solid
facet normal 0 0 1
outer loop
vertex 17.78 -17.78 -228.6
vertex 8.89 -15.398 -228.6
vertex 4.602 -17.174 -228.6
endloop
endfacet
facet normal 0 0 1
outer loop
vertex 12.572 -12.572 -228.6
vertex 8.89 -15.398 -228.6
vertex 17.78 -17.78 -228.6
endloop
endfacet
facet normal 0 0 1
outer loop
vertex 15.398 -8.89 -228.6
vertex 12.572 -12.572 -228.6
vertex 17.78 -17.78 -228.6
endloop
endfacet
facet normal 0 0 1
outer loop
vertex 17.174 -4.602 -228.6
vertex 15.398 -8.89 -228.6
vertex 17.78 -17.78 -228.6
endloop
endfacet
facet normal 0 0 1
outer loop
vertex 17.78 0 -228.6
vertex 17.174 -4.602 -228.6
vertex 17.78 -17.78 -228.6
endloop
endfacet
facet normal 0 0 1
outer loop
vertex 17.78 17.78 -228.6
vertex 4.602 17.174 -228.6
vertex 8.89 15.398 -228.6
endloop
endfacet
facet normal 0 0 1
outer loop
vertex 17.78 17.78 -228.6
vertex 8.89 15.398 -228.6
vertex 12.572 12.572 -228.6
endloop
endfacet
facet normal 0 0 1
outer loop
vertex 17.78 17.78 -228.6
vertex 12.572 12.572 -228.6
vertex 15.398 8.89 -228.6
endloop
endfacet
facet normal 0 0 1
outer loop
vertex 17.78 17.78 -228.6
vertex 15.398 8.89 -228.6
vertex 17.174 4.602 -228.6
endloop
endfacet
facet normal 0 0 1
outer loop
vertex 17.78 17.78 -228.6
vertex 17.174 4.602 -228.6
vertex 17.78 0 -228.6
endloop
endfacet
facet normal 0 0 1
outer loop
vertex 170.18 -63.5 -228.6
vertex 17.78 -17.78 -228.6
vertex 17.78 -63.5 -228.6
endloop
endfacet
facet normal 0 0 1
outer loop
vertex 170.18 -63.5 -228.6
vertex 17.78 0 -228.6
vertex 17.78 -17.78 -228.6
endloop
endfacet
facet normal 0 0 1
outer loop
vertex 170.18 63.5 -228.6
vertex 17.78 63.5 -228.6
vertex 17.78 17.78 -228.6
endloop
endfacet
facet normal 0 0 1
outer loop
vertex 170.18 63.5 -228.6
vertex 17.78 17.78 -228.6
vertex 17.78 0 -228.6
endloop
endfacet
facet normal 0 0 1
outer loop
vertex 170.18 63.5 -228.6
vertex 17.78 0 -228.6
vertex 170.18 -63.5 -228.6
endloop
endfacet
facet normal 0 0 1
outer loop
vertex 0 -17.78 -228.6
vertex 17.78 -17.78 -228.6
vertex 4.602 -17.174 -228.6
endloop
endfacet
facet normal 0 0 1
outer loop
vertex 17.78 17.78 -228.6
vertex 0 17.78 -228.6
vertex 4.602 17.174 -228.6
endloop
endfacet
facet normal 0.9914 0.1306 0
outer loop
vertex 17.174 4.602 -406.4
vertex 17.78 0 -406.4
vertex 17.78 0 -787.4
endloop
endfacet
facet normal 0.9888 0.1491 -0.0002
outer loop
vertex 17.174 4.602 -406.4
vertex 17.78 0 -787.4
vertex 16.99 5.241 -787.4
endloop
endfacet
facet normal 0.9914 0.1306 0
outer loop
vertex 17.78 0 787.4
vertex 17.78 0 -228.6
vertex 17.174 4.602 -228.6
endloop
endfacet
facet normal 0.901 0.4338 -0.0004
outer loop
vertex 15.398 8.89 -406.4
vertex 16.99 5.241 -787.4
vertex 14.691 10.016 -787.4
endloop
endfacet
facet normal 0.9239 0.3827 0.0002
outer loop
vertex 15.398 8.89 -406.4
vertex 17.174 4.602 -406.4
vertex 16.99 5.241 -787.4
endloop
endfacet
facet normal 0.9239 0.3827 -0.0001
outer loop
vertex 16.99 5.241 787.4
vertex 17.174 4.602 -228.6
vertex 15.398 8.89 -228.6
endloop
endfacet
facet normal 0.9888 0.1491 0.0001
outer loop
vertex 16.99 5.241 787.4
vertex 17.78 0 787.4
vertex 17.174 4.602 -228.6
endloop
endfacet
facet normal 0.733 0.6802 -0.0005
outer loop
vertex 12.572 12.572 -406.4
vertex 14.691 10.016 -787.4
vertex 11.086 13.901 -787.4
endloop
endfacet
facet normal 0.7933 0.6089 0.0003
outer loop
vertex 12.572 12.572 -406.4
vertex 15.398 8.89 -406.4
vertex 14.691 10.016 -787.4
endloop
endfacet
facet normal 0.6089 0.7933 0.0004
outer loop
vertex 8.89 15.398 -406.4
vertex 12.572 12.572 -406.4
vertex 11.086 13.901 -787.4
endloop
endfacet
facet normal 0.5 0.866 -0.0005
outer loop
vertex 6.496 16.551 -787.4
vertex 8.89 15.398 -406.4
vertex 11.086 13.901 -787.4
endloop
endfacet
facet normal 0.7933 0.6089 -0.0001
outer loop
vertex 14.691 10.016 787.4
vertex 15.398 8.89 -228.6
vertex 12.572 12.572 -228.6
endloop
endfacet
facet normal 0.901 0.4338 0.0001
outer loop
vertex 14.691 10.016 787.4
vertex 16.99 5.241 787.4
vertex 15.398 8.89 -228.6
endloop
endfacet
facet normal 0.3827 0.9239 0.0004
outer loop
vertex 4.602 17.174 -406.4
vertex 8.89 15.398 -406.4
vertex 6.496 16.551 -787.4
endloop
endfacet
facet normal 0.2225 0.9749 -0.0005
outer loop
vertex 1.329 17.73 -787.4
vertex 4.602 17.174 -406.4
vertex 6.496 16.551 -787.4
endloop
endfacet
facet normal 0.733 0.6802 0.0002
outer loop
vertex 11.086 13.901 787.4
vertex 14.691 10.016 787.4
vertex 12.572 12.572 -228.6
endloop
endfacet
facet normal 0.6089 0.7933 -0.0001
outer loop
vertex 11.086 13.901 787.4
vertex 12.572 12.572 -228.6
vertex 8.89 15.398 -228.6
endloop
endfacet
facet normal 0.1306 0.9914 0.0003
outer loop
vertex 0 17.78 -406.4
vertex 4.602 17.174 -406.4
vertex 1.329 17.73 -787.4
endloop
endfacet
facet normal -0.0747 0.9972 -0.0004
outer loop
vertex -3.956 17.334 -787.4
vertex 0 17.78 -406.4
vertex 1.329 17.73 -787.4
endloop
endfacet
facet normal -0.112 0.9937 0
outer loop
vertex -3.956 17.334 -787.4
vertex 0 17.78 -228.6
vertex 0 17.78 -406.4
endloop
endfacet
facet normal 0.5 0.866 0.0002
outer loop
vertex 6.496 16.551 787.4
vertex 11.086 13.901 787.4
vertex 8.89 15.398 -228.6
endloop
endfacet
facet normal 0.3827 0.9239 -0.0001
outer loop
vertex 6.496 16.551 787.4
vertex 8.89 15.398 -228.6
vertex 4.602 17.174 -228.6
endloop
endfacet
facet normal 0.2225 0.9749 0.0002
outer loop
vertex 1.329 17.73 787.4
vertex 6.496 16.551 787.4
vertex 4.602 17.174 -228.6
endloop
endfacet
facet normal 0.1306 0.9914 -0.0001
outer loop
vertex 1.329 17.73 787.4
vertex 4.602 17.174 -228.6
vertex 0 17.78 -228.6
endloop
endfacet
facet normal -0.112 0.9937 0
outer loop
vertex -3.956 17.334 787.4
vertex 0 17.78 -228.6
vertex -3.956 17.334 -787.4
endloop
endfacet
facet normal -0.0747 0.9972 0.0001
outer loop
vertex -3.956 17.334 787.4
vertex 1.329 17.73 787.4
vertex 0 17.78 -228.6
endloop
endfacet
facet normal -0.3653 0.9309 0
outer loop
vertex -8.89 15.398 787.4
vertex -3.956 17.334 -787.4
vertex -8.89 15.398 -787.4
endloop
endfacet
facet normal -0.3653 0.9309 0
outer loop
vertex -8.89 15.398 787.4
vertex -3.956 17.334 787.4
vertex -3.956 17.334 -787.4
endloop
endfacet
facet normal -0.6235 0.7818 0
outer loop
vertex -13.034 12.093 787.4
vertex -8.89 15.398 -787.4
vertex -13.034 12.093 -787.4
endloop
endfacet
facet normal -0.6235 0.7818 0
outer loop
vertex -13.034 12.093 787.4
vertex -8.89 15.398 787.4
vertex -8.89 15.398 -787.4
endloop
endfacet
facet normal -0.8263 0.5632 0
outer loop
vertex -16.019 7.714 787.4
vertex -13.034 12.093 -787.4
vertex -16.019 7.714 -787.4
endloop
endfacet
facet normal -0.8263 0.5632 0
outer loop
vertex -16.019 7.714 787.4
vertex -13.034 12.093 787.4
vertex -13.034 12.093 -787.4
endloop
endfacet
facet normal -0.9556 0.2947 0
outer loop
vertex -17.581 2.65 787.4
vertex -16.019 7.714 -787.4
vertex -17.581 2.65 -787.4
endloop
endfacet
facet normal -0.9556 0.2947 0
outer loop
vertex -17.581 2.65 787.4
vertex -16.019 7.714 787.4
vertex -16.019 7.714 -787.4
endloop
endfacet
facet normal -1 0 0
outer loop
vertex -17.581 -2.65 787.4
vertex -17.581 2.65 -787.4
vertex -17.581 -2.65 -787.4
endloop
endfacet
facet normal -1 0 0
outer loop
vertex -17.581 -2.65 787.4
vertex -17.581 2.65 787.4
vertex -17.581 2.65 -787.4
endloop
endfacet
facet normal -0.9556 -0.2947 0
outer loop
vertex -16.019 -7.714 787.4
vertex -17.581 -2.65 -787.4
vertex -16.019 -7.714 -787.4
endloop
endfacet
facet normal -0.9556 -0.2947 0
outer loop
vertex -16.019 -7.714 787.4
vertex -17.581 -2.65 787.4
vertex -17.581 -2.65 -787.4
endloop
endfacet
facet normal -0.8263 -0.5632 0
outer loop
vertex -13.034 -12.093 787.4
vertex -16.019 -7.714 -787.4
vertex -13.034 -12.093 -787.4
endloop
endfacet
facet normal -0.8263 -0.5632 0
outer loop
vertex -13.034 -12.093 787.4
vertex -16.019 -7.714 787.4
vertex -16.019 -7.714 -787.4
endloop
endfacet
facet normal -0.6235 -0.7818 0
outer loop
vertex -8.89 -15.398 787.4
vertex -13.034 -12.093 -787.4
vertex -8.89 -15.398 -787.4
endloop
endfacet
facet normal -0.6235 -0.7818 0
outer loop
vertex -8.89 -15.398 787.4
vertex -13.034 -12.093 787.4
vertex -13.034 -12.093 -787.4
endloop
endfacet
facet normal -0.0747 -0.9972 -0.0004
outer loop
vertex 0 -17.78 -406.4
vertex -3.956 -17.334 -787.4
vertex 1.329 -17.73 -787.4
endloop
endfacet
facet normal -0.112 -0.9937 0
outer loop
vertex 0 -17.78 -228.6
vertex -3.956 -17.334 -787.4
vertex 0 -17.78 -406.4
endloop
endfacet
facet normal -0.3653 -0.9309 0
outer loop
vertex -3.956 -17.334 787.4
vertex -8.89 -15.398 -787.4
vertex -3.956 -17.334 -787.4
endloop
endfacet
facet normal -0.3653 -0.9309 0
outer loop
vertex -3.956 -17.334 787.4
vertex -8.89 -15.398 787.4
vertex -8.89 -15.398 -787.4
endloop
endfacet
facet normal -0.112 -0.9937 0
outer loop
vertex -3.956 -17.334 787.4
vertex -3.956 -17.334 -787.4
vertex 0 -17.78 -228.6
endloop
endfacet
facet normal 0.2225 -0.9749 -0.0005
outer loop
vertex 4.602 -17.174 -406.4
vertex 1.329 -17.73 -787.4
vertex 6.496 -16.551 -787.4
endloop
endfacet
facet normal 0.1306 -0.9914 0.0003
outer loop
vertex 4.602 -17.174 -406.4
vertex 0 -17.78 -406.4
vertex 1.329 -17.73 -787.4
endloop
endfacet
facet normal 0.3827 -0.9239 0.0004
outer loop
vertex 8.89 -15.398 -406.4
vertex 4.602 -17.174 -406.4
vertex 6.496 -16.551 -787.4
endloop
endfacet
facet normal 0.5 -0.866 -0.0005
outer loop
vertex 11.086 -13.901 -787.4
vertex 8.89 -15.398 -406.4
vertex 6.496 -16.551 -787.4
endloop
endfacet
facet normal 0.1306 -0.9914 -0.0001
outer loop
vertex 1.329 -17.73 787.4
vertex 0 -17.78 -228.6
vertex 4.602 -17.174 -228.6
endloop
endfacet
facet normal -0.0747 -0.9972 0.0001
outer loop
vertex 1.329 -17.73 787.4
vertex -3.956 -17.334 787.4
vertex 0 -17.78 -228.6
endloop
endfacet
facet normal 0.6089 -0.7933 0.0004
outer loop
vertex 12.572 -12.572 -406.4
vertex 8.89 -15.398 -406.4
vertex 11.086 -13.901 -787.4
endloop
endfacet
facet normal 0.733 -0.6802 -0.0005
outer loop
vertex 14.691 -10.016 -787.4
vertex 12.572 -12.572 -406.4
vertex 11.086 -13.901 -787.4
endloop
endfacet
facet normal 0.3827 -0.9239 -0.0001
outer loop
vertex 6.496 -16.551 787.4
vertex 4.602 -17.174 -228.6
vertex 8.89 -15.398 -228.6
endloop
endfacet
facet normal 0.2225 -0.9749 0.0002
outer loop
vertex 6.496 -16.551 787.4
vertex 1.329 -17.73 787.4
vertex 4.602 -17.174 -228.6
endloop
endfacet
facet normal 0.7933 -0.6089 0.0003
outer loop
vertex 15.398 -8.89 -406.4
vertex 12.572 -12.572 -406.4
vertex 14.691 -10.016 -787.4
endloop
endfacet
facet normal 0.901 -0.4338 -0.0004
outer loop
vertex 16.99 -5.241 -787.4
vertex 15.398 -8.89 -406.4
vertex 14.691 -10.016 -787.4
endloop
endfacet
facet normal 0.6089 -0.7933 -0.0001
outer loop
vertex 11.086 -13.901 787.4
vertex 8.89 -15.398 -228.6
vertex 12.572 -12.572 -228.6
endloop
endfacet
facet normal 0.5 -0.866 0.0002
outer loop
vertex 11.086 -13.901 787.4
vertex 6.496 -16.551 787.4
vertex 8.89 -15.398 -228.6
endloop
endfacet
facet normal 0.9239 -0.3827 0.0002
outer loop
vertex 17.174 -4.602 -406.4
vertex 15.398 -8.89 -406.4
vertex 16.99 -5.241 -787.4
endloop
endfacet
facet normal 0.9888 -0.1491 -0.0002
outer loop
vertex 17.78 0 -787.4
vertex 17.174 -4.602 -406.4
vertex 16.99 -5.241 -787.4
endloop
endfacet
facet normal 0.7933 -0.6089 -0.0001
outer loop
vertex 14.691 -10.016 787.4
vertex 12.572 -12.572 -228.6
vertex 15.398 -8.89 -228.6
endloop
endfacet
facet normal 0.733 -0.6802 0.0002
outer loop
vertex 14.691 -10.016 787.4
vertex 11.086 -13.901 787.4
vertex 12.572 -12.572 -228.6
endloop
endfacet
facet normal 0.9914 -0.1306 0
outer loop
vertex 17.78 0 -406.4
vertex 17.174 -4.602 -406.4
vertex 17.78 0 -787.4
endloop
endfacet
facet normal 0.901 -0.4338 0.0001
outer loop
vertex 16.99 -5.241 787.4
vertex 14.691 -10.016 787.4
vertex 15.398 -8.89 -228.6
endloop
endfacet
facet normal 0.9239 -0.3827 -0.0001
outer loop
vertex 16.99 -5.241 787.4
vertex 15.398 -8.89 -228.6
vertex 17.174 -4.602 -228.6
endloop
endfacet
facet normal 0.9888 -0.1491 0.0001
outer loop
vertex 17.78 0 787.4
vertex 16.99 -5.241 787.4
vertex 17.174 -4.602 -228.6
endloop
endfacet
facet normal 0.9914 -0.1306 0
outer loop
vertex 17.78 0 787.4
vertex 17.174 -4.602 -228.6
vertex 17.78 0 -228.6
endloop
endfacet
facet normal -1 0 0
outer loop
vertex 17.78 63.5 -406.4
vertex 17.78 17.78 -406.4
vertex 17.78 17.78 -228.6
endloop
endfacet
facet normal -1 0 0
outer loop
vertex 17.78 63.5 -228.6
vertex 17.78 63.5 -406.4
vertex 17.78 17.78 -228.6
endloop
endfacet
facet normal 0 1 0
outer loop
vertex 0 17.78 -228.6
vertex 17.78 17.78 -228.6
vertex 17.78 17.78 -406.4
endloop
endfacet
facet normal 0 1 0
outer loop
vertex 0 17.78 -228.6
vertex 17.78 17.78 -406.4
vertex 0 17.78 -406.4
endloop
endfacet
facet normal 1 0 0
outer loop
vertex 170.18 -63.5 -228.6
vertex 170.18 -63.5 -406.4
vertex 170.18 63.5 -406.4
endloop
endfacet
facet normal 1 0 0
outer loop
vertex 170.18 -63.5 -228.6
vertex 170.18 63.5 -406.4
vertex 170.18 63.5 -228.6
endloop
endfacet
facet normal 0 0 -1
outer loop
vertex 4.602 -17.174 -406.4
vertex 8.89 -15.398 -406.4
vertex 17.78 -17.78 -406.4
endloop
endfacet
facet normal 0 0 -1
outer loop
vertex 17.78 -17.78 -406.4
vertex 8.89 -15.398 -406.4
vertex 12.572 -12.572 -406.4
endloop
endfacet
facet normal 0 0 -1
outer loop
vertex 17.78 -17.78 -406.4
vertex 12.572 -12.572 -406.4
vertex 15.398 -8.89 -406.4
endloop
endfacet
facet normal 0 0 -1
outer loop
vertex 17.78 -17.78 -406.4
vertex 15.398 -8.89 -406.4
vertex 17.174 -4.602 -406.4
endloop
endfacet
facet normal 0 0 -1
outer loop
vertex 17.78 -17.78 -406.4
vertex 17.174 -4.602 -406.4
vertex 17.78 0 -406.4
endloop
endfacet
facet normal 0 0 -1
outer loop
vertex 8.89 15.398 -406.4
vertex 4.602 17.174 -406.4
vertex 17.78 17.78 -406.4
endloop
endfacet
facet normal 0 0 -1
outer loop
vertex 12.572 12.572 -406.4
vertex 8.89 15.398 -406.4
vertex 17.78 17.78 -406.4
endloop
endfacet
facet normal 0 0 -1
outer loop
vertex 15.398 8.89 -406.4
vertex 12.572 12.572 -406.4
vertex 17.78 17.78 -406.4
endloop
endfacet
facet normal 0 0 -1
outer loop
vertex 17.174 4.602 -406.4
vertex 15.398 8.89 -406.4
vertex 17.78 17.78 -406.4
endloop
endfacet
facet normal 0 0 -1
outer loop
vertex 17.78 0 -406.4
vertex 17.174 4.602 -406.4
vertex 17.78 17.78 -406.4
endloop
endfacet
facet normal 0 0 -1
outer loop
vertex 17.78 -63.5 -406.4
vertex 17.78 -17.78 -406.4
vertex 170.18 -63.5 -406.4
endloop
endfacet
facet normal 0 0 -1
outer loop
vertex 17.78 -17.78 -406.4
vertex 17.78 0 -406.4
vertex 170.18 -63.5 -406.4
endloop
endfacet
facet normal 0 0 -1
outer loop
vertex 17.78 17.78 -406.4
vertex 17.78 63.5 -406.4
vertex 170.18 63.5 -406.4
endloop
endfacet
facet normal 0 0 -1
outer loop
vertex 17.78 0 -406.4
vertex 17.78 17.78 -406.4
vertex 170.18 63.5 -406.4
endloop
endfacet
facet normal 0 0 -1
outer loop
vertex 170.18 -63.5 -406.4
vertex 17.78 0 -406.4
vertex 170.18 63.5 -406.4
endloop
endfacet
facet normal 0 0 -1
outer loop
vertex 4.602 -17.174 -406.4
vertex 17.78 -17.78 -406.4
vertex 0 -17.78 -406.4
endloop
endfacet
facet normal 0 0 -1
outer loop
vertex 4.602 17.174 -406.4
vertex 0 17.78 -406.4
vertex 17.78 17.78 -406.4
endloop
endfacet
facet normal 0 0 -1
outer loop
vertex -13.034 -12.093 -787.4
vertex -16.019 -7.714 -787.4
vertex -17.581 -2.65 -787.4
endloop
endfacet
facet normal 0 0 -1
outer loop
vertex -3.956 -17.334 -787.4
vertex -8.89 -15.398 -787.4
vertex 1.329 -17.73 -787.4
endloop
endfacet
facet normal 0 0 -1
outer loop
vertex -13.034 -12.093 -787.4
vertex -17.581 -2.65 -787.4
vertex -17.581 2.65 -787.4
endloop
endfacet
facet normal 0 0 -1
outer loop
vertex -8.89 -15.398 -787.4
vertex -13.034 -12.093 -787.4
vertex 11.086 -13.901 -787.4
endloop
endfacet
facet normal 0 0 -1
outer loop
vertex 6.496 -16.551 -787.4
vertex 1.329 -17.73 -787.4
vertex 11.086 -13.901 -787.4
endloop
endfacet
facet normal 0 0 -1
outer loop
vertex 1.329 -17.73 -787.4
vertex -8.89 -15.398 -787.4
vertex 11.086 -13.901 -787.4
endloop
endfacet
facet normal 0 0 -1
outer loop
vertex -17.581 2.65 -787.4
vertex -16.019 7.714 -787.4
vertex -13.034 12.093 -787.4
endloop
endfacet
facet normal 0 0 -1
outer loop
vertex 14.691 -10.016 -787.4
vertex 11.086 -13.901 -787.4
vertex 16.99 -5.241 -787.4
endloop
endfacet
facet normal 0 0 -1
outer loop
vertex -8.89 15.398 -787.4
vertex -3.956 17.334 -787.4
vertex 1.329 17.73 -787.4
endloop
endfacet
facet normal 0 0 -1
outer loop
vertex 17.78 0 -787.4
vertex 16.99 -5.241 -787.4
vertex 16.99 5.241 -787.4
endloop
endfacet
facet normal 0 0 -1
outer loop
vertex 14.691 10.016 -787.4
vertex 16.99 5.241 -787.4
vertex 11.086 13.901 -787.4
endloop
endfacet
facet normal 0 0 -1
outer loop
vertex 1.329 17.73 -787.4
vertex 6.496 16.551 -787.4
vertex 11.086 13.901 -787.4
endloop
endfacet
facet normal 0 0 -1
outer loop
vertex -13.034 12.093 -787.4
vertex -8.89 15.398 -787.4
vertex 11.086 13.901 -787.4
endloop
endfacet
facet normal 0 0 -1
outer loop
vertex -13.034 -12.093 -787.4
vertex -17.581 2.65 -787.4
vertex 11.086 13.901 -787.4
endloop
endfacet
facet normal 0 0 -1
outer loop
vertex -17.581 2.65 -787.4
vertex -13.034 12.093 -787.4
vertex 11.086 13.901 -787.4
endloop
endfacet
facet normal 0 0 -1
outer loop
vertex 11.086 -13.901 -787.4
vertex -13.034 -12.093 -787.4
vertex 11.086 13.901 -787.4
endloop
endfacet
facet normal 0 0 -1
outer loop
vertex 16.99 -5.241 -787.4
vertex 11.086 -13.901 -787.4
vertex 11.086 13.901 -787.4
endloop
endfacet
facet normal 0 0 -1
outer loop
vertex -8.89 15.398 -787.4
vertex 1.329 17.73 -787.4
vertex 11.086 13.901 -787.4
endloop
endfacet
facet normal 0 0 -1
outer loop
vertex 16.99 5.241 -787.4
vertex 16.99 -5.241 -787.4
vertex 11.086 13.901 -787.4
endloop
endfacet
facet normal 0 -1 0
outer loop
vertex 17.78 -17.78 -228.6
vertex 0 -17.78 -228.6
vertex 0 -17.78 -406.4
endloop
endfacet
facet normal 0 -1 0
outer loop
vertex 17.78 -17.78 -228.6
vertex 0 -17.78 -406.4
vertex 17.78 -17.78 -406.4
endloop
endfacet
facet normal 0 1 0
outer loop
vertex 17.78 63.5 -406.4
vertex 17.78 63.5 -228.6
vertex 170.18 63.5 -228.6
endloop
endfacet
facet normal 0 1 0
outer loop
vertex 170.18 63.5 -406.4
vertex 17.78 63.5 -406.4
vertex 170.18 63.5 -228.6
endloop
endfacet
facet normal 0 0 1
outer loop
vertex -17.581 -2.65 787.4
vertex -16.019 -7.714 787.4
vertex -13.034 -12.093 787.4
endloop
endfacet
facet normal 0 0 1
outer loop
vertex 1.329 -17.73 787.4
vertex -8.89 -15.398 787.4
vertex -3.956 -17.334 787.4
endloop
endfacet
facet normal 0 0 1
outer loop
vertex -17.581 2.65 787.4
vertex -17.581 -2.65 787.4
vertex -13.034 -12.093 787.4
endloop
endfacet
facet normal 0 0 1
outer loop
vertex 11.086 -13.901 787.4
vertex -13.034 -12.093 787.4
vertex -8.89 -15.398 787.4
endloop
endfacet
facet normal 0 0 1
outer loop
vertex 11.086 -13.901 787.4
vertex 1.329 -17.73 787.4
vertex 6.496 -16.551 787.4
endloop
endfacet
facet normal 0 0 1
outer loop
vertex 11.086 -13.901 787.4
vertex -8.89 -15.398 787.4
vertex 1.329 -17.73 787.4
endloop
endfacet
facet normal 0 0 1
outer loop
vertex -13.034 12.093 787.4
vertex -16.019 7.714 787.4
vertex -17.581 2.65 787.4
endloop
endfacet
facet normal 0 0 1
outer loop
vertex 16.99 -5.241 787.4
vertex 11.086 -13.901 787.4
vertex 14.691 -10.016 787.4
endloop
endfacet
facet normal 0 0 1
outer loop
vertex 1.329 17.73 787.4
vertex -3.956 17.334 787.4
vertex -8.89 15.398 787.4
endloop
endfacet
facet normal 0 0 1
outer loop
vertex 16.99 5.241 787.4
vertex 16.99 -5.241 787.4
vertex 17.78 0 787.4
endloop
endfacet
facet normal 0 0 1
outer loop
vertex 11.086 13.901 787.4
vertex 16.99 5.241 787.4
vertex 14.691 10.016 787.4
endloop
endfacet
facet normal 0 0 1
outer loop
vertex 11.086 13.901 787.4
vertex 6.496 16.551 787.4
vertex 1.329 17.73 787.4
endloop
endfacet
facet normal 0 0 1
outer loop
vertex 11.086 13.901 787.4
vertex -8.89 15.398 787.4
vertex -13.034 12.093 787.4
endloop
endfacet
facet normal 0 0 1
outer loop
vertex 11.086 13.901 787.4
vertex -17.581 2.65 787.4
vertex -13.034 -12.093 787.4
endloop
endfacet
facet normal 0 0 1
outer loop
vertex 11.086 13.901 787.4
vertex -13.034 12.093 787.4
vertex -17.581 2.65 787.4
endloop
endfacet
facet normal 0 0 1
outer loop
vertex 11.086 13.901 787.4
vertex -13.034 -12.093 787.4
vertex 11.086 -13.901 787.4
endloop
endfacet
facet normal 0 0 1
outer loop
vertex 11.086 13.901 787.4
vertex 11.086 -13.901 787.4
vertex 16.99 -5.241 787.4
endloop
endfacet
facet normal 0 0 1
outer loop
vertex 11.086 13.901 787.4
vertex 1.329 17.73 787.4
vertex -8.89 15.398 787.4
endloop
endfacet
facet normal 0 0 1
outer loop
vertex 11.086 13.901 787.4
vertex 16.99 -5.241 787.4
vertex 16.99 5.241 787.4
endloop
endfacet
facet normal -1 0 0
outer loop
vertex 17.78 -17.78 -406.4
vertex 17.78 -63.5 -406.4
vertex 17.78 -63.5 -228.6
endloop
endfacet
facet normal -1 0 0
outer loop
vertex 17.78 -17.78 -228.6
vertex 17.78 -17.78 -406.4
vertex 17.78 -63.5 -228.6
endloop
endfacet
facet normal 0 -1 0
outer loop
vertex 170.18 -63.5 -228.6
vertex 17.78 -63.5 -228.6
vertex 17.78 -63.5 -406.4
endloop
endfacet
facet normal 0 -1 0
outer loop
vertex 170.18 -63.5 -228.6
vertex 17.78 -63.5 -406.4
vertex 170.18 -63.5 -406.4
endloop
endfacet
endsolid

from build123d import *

# Parameters (mm, degrees)
F0_R     = 17.78
F1_DEPTH = 787.4
F2_W     = 152.4
F2_H     = 177.8
F3_DEPTH = 63.5
F5_DEPTH = 177.8


with BuildPart() as f1:
    # F0 (on Top) → F1 (new body, symmetric)
    with BuildSketch(Plane.XY):
        Circle(F0_R)
    extrude(amount=F1_DEPTH, both=True)

    # F2 (on Front) → F3 (join, symmetric)
    with BuildSketch(Plane.XZ):
        with Locations((93.98, -317.5)):
            Rectangle(F2_W, F2_H)
    extrude(amount=F3_DEPTH, both=True)

    # F4 (on face) → F5 (join, through all)
    with BuildSketch(Plane.XY.offset(-228.6)):
        with BuildLine():
            Line((17.78, -17.78), (17.78, 0))
            ThreePointArc((17.78, 0), (12.5723585695, -12.5723585695), (0, -17.78))
            Line((0, -17.78), (17.78, -17.78))
        make_face()
        with BuildLine():
            ThreePointArc((0, 17.78), (12.5723585695, 12.5723585695), (17.78, 0))
            Line((17.78, 0), (17.78, 17.78))
            Line((17.78, 17.78), (0, 17.78))
        make_face()
    extrude(amount=-F5_DEPTH)


solid = f1.part
